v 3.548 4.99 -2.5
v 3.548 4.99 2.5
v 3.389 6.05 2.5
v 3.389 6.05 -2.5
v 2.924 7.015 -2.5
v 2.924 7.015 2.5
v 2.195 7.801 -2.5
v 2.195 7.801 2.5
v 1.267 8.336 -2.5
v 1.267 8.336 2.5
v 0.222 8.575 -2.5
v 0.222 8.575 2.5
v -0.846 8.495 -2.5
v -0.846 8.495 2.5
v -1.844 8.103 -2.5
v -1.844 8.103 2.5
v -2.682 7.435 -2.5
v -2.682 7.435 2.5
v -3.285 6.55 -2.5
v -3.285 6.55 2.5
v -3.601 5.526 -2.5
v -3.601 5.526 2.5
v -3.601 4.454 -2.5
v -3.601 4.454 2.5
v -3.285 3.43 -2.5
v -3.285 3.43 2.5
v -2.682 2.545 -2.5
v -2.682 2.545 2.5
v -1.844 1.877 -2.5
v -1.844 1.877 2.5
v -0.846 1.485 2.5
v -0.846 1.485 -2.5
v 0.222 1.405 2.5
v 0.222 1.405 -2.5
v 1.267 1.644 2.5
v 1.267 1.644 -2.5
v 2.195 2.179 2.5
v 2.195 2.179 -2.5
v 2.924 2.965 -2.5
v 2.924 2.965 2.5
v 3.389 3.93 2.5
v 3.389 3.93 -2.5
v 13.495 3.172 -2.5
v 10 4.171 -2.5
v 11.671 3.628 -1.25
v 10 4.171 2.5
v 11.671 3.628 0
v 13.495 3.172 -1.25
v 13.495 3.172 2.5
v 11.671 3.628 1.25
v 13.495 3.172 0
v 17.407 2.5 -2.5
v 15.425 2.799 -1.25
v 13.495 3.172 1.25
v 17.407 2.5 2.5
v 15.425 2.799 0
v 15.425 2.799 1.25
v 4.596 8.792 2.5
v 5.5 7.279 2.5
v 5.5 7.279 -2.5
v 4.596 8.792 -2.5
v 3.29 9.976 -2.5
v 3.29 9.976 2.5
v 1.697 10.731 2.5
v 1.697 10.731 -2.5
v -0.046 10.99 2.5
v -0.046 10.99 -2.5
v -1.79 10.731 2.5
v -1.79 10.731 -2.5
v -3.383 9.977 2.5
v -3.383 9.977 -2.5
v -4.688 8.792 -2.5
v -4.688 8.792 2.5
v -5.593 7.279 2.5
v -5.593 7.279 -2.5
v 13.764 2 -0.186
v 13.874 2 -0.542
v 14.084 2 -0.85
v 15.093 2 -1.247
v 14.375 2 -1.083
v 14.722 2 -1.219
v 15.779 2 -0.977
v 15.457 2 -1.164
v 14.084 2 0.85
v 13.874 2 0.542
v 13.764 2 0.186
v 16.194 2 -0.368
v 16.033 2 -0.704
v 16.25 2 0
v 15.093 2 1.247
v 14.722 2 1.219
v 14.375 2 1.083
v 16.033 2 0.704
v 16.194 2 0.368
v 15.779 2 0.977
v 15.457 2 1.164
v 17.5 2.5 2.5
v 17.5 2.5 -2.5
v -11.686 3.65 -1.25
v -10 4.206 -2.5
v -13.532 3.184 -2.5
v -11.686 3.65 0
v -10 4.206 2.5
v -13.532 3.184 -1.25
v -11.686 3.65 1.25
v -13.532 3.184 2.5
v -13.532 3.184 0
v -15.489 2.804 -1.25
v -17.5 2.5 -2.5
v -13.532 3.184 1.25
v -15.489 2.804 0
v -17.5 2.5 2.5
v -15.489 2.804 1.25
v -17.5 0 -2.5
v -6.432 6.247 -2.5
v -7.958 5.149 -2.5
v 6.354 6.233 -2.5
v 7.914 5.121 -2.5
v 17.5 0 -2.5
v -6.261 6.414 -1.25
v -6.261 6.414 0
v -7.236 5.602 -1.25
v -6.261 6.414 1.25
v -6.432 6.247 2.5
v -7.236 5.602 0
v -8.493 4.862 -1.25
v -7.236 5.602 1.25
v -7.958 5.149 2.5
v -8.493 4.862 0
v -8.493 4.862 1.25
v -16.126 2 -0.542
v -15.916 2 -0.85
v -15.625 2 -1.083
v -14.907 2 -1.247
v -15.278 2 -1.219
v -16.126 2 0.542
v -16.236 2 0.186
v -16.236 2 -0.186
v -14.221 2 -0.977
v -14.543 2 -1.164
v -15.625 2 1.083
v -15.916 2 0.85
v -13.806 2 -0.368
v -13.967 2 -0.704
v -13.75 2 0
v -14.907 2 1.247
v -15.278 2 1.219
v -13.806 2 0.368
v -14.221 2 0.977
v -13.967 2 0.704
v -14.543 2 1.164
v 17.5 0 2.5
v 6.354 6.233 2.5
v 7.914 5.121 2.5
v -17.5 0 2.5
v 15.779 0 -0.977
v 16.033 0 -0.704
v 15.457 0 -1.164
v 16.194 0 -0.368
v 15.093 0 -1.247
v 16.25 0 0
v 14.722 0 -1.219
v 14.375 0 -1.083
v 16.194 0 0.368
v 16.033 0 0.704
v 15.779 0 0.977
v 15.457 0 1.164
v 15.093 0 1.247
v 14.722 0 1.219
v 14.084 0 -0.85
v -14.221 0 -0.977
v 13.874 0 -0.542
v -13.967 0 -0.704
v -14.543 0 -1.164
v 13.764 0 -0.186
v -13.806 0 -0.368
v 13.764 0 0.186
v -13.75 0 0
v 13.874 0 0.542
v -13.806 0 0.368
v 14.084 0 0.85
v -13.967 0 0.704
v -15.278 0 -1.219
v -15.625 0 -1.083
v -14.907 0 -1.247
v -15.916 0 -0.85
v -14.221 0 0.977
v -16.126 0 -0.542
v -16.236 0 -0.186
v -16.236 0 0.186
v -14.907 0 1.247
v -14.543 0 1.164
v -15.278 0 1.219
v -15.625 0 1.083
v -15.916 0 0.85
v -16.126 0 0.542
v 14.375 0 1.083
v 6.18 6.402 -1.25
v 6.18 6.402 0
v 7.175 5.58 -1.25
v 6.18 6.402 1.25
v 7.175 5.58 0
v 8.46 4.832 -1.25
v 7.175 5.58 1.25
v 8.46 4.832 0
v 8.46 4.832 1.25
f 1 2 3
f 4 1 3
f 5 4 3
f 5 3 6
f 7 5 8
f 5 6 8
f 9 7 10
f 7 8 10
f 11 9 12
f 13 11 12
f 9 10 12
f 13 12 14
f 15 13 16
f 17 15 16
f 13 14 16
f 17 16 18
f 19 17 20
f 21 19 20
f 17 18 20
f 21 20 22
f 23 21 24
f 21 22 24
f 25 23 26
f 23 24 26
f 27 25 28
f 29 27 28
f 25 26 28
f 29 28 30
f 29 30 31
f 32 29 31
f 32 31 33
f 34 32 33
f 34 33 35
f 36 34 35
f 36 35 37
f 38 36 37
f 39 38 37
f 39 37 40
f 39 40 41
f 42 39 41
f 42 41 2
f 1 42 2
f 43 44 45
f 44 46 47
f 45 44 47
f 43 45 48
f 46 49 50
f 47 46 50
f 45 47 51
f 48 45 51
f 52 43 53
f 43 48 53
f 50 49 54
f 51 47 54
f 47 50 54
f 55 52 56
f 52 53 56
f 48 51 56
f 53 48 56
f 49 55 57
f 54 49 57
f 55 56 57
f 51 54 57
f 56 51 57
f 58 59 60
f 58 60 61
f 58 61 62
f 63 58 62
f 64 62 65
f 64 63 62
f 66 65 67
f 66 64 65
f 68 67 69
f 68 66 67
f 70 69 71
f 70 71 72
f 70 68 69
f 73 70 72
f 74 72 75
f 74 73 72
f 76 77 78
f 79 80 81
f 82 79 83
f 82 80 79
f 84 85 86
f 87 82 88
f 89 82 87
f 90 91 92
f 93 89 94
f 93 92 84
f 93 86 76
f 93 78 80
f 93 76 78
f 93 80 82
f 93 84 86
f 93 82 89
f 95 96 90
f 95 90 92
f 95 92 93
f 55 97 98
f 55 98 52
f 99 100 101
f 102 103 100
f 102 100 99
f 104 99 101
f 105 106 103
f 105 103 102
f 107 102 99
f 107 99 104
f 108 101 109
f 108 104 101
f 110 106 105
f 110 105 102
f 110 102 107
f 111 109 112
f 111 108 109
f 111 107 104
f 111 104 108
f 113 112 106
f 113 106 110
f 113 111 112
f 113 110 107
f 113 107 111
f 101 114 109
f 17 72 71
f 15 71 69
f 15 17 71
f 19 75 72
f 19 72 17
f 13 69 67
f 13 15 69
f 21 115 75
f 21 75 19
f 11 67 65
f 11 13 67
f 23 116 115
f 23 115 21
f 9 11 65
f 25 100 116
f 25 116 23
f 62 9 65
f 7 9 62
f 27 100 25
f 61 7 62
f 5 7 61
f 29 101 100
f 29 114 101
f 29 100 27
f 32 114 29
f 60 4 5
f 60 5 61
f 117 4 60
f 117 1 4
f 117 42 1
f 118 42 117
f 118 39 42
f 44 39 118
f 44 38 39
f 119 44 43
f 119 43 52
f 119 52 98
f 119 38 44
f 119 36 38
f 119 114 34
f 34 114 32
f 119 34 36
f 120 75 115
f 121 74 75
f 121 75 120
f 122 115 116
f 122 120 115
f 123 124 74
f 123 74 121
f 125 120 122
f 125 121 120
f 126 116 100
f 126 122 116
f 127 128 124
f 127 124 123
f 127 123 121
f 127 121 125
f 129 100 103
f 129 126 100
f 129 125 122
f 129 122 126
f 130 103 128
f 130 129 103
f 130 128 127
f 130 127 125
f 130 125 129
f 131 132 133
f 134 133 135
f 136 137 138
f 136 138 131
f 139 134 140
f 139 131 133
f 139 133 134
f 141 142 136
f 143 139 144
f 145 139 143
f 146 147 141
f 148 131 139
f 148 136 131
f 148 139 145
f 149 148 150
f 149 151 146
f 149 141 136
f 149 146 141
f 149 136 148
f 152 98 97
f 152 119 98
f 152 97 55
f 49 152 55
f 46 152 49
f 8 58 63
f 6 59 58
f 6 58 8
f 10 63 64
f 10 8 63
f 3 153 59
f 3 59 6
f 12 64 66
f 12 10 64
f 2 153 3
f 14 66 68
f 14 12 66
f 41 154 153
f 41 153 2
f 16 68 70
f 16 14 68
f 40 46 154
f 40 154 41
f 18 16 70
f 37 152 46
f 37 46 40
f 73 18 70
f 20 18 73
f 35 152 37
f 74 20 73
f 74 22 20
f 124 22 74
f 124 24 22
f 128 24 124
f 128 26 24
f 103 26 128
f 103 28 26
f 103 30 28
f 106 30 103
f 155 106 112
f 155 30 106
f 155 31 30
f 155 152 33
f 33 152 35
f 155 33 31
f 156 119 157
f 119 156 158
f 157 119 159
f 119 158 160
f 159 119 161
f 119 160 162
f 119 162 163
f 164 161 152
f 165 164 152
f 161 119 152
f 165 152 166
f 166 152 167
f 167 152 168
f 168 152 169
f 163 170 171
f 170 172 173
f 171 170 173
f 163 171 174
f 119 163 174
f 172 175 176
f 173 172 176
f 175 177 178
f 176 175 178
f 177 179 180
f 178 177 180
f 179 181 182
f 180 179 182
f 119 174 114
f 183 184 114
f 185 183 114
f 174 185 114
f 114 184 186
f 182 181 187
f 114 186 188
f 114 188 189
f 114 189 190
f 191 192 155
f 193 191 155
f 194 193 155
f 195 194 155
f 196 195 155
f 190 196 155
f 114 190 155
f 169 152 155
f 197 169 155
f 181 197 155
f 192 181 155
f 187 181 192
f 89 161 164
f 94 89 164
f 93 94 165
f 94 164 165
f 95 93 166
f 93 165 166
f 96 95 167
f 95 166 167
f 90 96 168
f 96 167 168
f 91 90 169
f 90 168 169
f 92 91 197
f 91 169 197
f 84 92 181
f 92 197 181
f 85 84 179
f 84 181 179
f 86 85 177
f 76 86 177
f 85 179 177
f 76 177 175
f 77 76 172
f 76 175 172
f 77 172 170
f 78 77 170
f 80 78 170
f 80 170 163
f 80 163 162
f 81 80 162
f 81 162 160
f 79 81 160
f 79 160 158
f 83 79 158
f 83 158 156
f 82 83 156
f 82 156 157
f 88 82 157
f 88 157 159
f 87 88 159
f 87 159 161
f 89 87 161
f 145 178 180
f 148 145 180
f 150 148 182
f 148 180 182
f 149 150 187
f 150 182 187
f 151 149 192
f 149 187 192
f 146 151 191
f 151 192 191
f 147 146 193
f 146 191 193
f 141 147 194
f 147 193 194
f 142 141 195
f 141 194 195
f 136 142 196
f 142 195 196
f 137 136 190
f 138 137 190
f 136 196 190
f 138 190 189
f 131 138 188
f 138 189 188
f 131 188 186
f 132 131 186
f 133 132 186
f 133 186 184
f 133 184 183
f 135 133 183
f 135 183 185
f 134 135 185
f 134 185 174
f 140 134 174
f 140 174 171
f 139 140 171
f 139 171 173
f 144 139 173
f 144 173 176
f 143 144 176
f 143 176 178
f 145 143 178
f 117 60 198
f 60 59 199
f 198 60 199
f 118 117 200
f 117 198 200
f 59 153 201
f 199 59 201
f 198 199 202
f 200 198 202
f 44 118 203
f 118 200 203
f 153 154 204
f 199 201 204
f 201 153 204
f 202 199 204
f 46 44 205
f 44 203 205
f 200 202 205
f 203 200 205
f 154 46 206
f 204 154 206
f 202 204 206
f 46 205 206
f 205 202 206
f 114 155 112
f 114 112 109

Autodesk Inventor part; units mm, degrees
ref_plane "YZ Plane" through (0, 0, 0) normal (1, 0, 0) x (0, 1, 0)
ref_plane "XZ Plane" through (0, 0, 0) normal (0, 1, 0) x (-1, 0, 0)
ref_plane "XY Plane" through (0, 0, 0) normal (0, 0, 1) x (1, 0, 0)
sketch "Sketch1" plane through (0, 0, 0) normal (0, 1, 0) x (-1, 0, 0)
  line L0 (-17.5, 2.5) -> (17.5, 2.5)
  line L1 (17.5, 2.5) -> (17.5, -2.5)
  line L2 (17.5, -2.5) -> (-17.5, -2.5)
  line L3 (-17.5, -2.5) -> (-17.5, 2.5)
  line L4 (-17.5, 2.5) -> (17.5, -2.5) construction
  line L5 (17.5, 2.5) -> (-17.5, -2.5) construction
  line L6 (-10, 2.5) -> (10, 2.5)
  line L7 (10, 2.5) -> (10, -2.5)
  line L8 (10, -2.5) -> (-10, -2.5)
  line L9 (-10, -2.5) -> (-10, 2.5)
  line L10 (-10, 2.5) -> (10, -2.5) construction
  line L11 (10, 2.5) -> (-10, -2.5) construction
  point P0 (0, 0)
  dimension "d0" = 35
  dimension "d1" = 5
  dimension "d2" = 20
extrude "Extrusion1" add sketch "Sketch1" along normal blind 2.5 contours L0 L9 L2 L3 | L0 L1 L2 L7
extrude "Extrusion2" add sketch "Sketch1" along normal blind 30 contours L0 L7 L2 L9
sketch "Sketch2" plane through (-17.5, 0, 2.5) normal (0, 0, 1) x (1, 0, 0)
  line L0 (0, 2.5) -> (7.5, 2.5) projected
  line L1 (27.5, 2.5) -> (35, 2.5) projected
  line L2 (27.5, 2.5) -> (27.5, 30) projected
  line L3 (7.5, 2.5) -> (7.5, 30) projected
  line L4 (7.5, 30) -> (27.5, 30) projected
  line L5 (35, 0) -> (0, 0) projected
  line L6 (0, 0) -> (0, 2.5) projected
  line L7 (35, 0) -> (35, 2.5) projected
  line L8 (7.5, 2.5) -> (0, 2.5) projected
  line L9 (0, 0) -> (35, 0) projected
  circle A0 centre (17.4535, 4.99) radius 3.595
  circle A1 centre (17.4535, 4.99) radius 6
  line L10 (12.1387, 7.7745) -> (11.4535, 5.8766) construction
  line L11 (11.4535, 5.8766) -> (8.7602, 4.0511) construction
  line L12 (8.7602, 4.0511) -> (4.3576, 3.0847) construction
  line L13 (4.3576, 3.0847) -> (0, 2.5) construction
  spline S0 degree 4 poles (12.1387, 7.7745) (11.4535, 5.8766) (8.7602, 4.0511) (4.3576, 3.0847) (0, 2.5) knots 1 1 1 1 1 2 2 2 2 2
  line L14 (17.4535, 4.99) -> (17.4535, 2.7924)
  line L15 (22.7682, 7.7745) -> (23.4535, 5.8766) construction
  line L16 (23.4535, 5.8766) -> (26.1467, 4.0511) construction
  line L17 (26.1467, 4.0511) -> (30.5493, 3.0847) construction
  line L18 (30.5493, 3.0847) -> (34.907, 2.5) construction
  spline S1 degree 4 poles (22.7682, 7.7745) (23.4535, 5.8766) (26.1467, 4.0511) (30.5493, 3.0847) (34.907, 2.5) knots 1 1 1 1 1 2 2 2 2 2
  point P0 (17.5, 0)
  point P1 (17.5, 0)
  point P2 (17.5, 0)
  point P3 (17.5, 0)
  point P4 (7.5, 10.9282)
  point P5 (27.5, 10.9282)
  point P6 (17.5, 0)
  point P7 (7.5, 6.3541)
  point P8 (27.5, 4.99)
  point P9 (7.5, 6.3541)
  point P10 (7.5, 4.2058)
  point P11 (11.9072, 7.2788)
  point P12 (22.9998, 7.2788)
  point P13 (27.5, 4.171)
  dimension "d77" = 12
  dimension "d58" = 7.19
  dimension "d59" = 4.99
extrude "Extrusion10" cut sketch "Sketch2" against normal blind 19.9625 contours A0
sketch "Sketch4" plane through (0, 0, 0) normal (0, -1, 0) x (1, 0, 0)
  line L0 (-17.5, -2.5) -> (-17.5, 2.5) projected
  line L1 (17.5, 2.5) -> (17.5, -2.5) projected
  circle A0 centre (-15, 0) radius 1.25
  line L2 (0, 0) -> (0, -2.2374)
  circle A1 centre (15, 0) radius 1.25
  point P0 (-17.5, 0)
  point P1 (17.5, 0)
  dimension "d68" = 2.5
  dimension "d71" = 2.5
  dimension "d72" = 2.5
extrude "Extrusion14" cut sketch "Sketch4" against normal blind 2
extrude "Extrusion17" cut sketch "Sketch2" against normal blind 5 contours L3 L4 L2 S1 A1 S0
extrude "Extrusion18" add sketch "Sketch2" against normal blind 5 contours S0 L3 L0 | S1 L1 L2
properties part number "chassis 2"
